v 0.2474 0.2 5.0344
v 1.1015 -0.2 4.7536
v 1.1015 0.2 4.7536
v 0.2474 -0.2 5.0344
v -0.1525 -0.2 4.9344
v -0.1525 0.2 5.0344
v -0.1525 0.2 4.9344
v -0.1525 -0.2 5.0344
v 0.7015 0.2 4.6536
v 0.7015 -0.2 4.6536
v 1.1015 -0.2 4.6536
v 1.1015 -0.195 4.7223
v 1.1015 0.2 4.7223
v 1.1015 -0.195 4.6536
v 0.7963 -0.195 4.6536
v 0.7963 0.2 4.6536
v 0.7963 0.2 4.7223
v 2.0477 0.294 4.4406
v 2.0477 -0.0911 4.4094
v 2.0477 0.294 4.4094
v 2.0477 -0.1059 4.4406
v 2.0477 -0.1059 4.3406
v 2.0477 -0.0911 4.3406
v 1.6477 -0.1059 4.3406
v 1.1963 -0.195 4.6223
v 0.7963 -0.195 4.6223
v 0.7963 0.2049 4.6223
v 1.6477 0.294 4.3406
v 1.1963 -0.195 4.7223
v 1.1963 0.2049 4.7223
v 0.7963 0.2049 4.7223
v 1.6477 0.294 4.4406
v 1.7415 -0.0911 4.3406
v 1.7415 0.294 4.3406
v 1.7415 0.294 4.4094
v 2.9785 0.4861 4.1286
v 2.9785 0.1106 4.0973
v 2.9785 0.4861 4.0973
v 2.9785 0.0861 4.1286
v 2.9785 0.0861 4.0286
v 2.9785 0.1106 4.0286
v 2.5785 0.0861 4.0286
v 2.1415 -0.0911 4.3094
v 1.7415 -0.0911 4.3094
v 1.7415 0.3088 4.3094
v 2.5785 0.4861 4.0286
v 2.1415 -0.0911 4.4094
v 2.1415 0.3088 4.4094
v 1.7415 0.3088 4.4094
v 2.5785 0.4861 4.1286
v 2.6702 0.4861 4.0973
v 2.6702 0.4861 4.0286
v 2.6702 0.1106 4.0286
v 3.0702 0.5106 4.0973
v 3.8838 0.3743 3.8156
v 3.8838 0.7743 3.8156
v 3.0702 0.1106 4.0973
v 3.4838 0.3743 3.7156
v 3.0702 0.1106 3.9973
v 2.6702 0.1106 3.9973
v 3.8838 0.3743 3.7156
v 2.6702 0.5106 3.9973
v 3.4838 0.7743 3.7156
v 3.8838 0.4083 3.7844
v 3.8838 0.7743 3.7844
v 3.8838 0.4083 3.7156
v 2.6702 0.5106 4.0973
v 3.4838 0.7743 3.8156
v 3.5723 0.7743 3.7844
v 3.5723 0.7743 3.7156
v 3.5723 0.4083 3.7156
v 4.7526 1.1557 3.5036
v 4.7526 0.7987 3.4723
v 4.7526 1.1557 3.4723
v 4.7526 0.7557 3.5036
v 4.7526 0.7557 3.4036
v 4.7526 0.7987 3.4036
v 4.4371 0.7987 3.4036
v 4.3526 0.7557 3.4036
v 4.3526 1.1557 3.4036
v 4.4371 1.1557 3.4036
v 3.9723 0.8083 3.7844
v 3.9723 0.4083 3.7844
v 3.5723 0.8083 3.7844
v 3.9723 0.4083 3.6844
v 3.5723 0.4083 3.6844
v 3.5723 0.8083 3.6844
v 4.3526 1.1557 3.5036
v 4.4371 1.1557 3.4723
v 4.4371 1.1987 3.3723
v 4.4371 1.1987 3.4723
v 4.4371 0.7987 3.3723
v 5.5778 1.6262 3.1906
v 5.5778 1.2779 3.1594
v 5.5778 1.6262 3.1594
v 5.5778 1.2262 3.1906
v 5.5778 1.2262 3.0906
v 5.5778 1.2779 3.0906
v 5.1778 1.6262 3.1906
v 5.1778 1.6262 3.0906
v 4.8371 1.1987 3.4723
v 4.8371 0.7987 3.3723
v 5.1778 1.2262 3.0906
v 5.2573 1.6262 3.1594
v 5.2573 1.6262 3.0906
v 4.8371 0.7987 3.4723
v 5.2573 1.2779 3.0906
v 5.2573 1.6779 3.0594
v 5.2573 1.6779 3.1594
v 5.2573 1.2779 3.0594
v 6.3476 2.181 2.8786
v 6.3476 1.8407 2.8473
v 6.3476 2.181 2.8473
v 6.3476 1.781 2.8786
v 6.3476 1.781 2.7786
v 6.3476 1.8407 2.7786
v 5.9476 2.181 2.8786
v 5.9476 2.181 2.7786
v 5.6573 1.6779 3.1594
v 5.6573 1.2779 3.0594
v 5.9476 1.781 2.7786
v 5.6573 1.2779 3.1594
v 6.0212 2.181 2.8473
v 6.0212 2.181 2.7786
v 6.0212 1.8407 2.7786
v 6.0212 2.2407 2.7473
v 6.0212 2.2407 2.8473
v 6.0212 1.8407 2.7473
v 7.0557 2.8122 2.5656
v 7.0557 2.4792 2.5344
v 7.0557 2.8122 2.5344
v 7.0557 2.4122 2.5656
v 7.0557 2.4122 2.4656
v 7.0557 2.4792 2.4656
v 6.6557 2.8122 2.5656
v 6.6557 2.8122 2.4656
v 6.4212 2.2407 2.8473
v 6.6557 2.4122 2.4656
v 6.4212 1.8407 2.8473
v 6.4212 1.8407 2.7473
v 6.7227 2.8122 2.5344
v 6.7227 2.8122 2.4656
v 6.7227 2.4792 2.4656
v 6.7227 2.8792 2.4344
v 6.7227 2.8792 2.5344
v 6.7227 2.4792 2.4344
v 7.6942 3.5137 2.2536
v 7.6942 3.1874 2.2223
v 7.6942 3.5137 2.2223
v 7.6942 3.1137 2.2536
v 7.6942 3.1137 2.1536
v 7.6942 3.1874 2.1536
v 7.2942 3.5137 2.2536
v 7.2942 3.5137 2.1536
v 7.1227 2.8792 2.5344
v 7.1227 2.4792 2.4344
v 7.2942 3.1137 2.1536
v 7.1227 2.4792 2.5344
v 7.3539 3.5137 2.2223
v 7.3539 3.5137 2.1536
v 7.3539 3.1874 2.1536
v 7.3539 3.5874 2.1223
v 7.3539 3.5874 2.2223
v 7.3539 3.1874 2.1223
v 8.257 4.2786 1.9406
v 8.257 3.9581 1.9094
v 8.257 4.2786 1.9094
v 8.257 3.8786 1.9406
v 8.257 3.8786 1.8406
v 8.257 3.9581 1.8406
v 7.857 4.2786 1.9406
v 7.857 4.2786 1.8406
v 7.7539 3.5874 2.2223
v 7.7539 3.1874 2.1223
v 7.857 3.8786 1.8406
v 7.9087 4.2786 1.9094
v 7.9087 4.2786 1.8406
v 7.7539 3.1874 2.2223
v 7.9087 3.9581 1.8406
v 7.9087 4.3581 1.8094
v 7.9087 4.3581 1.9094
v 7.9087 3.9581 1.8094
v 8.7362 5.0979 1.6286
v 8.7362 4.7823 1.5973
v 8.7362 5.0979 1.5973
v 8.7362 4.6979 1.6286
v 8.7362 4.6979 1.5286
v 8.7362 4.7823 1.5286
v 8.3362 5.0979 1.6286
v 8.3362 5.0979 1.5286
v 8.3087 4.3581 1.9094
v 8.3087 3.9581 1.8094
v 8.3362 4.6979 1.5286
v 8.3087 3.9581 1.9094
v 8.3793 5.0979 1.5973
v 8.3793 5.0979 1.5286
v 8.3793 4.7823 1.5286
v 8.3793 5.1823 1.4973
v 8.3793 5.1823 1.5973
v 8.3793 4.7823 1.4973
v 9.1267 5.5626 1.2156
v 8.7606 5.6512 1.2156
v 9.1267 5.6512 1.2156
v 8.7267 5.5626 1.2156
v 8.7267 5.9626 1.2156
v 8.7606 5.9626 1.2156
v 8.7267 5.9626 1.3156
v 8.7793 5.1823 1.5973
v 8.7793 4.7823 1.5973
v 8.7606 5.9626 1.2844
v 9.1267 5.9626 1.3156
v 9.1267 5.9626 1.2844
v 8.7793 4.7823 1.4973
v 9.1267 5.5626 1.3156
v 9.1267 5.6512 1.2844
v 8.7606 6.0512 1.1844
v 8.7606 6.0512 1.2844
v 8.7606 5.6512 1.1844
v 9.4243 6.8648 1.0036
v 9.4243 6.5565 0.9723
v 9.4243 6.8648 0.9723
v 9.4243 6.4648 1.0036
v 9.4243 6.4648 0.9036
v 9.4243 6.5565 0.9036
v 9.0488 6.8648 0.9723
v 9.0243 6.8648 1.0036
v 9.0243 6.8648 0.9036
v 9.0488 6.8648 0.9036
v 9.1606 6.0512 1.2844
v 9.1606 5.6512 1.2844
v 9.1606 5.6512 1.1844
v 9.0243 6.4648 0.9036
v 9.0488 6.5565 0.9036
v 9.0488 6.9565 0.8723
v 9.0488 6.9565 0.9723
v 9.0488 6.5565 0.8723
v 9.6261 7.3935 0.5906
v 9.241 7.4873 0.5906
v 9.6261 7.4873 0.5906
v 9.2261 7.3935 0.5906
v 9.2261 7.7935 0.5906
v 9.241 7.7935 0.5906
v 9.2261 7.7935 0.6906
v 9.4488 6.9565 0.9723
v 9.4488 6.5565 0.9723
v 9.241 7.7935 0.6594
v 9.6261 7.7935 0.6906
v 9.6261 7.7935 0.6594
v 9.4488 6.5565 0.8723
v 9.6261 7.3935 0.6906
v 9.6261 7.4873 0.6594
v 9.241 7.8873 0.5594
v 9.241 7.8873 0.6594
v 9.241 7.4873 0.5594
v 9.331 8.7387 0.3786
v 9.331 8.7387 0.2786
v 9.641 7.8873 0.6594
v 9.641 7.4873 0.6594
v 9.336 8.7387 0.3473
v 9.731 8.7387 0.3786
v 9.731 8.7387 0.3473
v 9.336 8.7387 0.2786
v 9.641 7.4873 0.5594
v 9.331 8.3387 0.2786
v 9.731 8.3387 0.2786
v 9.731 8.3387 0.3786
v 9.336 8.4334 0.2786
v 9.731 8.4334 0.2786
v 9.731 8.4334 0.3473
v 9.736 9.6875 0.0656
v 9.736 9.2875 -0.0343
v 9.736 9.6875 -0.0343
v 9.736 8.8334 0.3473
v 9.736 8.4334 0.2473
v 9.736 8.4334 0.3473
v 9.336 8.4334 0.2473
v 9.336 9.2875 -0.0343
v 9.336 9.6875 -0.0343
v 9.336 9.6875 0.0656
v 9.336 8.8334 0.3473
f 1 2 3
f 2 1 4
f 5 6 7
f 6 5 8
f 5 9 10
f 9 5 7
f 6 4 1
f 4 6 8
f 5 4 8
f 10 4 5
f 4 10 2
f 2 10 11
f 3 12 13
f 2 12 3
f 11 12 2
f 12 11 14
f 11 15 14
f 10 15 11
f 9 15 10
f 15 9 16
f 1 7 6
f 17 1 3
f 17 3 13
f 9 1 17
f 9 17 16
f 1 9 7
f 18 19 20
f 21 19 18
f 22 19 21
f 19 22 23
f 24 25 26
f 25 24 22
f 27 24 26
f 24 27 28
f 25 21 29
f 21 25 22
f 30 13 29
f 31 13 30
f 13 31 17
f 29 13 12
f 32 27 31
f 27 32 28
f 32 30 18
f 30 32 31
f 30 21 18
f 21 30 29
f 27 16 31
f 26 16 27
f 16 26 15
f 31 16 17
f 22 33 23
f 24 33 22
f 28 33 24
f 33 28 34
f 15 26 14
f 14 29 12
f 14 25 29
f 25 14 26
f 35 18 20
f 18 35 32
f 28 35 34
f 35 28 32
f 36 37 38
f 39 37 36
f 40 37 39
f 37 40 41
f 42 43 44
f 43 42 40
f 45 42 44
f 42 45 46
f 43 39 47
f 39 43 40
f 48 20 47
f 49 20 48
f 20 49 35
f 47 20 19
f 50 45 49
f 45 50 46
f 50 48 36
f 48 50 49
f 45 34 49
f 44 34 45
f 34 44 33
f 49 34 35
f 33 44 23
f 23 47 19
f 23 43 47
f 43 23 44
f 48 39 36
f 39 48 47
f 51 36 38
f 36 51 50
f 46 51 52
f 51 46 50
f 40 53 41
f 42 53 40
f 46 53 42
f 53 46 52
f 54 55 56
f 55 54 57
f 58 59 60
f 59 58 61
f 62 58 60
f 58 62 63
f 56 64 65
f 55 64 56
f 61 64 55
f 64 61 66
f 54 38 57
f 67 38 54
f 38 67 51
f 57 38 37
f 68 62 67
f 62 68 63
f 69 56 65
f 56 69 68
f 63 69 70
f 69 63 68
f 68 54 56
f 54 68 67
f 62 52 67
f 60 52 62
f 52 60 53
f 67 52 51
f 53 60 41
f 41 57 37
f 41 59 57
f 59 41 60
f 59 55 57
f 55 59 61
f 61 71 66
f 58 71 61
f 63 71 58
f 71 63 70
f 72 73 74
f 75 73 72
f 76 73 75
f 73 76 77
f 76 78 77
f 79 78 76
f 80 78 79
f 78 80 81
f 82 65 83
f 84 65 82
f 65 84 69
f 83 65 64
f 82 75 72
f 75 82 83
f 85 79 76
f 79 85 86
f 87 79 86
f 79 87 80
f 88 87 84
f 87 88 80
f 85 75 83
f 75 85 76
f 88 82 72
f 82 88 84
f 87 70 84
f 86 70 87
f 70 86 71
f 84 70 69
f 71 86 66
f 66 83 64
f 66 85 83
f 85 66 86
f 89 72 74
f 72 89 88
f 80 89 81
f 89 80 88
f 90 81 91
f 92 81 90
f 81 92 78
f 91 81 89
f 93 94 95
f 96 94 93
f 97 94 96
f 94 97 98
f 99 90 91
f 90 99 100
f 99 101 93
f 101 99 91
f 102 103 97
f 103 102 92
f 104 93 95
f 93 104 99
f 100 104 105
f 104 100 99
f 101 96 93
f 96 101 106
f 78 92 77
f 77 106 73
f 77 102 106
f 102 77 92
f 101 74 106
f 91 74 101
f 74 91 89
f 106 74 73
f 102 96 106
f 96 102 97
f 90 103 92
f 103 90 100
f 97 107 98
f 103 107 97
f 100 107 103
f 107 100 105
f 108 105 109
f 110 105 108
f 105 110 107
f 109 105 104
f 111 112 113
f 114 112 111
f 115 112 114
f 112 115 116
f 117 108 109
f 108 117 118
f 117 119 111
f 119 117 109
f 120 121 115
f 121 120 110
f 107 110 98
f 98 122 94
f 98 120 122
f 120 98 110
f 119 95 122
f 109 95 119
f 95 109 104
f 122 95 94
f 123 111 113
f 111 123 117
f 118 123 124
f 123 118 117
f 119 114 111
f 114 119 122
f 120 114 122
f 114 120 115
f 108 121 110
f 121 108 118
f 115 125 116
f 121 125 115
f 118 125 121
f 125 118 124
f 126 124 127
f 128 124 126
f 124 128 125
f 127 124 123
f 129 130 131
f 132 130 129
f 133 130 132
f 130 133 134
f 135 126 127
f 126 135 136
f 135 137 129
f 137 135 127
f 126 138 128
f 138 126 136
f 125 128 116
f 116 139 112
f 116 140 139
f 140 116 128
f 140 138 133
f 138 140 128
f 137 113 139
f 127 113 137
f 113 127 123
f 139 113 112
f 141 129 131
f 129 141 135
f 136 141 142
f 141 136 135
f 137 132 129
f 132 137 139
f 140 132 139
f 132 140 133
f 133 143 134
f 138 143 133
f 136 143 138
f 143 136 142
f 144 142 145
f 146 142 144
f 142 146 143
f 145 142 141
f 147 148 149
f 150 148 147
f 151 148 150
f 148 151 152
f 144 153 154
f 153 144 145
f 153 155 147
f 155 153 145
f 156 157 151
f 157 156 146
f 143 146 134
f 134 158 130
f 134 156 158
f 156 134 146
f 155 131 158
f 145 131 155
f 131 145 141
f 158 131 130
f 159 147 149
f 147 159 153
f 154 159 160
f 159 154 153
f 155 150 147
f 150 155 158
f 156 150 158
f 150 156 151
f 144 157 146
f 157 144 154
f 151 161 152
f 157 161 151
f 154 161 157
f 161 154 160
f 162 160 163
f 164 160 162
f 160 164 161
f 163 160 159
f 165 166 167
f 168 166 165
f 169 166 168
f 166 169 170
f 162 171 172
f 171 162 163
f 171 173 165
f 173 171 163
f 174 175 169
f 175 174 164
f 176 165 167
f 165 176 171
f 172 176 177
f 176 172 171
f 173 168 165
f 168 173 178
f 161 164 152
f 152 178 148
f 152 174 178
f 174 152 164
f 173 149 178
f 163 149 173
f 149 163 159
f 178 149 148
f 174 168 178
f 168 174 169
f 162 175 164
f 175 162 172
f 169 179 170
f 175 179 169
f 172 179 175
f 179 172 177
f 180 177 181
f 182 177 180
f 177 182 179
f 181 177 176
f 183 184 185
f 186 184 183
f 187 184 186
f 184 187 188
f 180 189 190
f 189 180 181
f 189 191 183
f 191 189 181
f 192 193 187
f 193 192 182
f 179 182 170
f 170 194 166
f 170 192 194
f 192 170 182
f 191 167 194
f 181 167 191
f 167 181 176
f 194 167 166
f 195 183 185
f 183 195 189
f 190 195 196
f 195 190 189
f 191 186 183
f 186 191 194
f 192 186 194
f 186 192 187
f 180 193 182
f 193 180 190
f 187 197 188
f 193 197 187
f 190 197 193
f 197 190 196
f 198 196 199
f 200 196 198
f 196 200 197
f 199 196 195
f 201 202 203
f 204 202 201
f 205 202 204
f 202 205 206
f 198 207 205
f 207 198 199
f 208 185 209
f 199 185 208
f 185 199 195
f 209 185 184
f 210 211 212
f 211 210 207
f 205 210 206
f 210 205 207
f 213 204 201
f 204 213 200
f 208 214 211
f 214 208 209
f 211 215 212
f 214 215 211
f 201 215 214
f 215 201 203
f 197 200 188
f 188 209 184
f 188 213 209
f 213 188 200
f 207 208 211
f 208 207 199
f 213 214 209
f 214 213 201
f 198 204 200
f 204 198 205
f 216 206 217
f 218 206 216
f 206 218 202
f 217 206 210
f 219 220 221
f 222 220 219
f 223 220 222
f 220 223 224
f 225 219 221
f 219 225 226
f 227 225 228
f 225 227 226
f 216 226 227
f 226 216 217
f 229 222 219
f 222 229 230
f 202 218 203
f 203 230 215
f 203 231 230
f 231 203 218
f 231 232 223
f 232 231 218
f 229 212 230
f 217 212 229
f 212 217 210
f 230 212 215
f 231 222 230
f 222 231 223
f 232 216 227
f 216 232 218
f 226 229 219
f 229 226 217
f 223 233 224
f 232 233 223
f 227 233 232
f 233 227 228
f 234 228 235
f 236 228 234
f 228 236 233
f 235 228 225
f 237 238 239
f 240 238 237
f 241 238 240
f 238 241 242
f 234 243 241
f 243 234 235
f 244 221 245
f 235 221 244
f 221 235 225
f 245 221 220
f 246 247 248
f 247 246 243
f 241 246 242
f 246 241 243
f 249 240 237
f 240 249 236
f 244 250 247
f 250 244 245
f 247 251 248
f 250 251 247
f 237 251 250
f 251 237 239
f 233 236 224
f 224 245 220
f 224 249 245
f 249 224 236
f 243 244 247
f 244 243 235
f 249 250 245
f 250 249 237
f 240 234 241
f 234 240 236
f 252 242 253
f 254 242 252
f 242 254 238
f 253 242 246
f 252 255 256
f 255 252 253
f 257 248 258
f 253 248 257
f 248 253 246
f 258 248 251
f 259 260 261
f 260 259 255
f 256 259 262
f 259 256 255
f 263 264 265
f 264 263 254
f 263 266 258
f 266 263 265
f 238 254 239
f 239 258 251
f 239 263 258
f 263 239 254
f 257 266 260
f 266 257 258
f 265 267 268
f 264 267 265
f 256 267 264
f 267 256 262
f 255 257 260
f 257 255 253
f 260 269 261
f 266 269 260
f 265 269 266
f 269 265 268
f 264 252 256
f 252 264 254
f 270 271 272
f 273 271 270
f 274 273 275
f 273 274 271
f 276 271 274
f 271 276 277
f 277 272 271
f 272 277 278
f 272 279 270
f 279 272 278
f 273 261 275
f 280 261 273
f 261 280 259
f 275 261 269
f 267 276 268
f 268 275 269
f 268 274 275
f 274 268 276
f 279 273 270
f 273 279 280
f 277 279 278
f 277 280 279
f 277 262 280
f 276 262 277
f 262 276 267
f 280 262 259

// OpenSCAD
hull() {
    translate([0.04745, 0.0, 4.9844]) cube([0.4, 0.4, 0.1], center=true);
    translate([0.90155, 0.0, 4.7036]) cube([0.4, 0.4, 0.1], center=true);
}


hull() {
    translate([0.9963, 0.00495, 4.67235]) cube([0.4, 0.4, 0.1], center=true);
    translate([1.8477000000000001, 0.09405000000000001, 4.39065]) cube([0.4, 0.4, 0.1], center=true);
}


hull() {
    translate([1.9415, 0.10885000000000002, 4.3594]) cube([0.4, 0.4, 0.1], center=true);
    translate([2.7785000000000006, 0.28614999999999996, 4.0786]) cube([0.4, 0.4, 0.1], center=true);
}


hull() {
    translate([2.8702000000000005, 0.31065, 4.04735]) cube([0.4, 0.4, 0.1], center=true);
    translate([3.6838, 0.57435, 3.76565]) cube([0.4, 0.4, 0.1], center=true);
}


hull() {
    translate([3.7723500000000003, 0.6083000000000001, 3.7344]) cube([0.4, 0.4, 0.1], center=true);
    translate([4.55265, 0.9557, 3.4536000000000002]) cube([0.4, 0.4, 0.1], center=true);
}


hull() {
    translate([4.63715, 0.9987499999999999, 3.4223500000000002]) cube([0.4, 0.4, 0.1], center=true);
    translate([5.37785, 1.42625, 3.14065]) cube([0.4, 0.4, 0.1], center=true);
}


hull() {
    translate([5.45735, 1.4779499999999999, 3.1094]) cube([0.4, 0.4, 0.1], center=true);
    translate([6.1476500000000005, 1.98105, 2.8286000000000002]) cube([0.4, 0.4, 0.1], center=true);
}


hull() {
    translate([6.22125, 2.04075, 2.7973500000000002]) cube([0.4, 0.4, 0.1], center=true);
    translate([6.8557500000000005, 2.6122500000000004, 2.51565]) cube([0.4, 0.4, 0.1], center=true);
}


hull() {
    translate([6.922750000000001, 2.6792500000000006, 2.4844]) cube([0.4, 0.4, 0.1], center=true);
    translate([7.494249999999999, 3.3137500000000006, 2.2036000000000002]) cube([0.4, 0.4, 0.1], center=true);
}


hull() {
    translate([7.5539499999999995, 3.3874000000000004, 2.1723500000000002]) cube([0.4, 0.4, 0.1], center=true);
    translate([8.057050000000002, 4.078600000000001, 1.89065]) cube([0.4, 0.4, 0.1], center=true);
}


hull() {
    translate([8.10875, 4.1581, 1.8594]) cube([0.4, 0.4, 0.1], center=true);
    translate([8.53625, 4.8979, 1.5786]) cube([0.4, 0.4, 0.1], center=true);
}


hull() {
    translate([8.5793, 4.98235, 1.54735]) cube([0.4, 0.4, 0.1], center=true);
    translate([8.926699999999999, 5.762650000000001, 1.26565]) cube([0.4, 0.4, 0.1], center=true);
}


hull() {
    translate([8.96065, 5.8512, 1.2344]) cube([0.4, 0.4, 0.1], center=true);
    translate([9.224350000000001, 6.6648, 0.9536]) cube([0.4, 0.4, 0.1], center=true);
}


hull() {
    translate([9.248850000000001, 6.7565, 0.92235]) cube([0.4, 0.4, 0.1], center=true);
    translate([9.42615, 7.5935, 0.6406499999999999]) cube([0.4, 0.4, 0.1], center=true);
}


hull() {
    translate([9.441, 7.6873, 0.6093999999999999]) cube([0.4, 0.4, 0.1], center=true);
    translate([9.531, 8.5387, 0.3286]) cube([0.4, 0.4, 0.1], center=true);
}


hull() {
    translate([9.536, 8.63345, 0.29735]) cube([0.4, 0.4, 0.1], center=true);
    translate([9.536, 9.48755, 0.01565]) cube([0.4, 0.4, 0.1], center=true);
}
